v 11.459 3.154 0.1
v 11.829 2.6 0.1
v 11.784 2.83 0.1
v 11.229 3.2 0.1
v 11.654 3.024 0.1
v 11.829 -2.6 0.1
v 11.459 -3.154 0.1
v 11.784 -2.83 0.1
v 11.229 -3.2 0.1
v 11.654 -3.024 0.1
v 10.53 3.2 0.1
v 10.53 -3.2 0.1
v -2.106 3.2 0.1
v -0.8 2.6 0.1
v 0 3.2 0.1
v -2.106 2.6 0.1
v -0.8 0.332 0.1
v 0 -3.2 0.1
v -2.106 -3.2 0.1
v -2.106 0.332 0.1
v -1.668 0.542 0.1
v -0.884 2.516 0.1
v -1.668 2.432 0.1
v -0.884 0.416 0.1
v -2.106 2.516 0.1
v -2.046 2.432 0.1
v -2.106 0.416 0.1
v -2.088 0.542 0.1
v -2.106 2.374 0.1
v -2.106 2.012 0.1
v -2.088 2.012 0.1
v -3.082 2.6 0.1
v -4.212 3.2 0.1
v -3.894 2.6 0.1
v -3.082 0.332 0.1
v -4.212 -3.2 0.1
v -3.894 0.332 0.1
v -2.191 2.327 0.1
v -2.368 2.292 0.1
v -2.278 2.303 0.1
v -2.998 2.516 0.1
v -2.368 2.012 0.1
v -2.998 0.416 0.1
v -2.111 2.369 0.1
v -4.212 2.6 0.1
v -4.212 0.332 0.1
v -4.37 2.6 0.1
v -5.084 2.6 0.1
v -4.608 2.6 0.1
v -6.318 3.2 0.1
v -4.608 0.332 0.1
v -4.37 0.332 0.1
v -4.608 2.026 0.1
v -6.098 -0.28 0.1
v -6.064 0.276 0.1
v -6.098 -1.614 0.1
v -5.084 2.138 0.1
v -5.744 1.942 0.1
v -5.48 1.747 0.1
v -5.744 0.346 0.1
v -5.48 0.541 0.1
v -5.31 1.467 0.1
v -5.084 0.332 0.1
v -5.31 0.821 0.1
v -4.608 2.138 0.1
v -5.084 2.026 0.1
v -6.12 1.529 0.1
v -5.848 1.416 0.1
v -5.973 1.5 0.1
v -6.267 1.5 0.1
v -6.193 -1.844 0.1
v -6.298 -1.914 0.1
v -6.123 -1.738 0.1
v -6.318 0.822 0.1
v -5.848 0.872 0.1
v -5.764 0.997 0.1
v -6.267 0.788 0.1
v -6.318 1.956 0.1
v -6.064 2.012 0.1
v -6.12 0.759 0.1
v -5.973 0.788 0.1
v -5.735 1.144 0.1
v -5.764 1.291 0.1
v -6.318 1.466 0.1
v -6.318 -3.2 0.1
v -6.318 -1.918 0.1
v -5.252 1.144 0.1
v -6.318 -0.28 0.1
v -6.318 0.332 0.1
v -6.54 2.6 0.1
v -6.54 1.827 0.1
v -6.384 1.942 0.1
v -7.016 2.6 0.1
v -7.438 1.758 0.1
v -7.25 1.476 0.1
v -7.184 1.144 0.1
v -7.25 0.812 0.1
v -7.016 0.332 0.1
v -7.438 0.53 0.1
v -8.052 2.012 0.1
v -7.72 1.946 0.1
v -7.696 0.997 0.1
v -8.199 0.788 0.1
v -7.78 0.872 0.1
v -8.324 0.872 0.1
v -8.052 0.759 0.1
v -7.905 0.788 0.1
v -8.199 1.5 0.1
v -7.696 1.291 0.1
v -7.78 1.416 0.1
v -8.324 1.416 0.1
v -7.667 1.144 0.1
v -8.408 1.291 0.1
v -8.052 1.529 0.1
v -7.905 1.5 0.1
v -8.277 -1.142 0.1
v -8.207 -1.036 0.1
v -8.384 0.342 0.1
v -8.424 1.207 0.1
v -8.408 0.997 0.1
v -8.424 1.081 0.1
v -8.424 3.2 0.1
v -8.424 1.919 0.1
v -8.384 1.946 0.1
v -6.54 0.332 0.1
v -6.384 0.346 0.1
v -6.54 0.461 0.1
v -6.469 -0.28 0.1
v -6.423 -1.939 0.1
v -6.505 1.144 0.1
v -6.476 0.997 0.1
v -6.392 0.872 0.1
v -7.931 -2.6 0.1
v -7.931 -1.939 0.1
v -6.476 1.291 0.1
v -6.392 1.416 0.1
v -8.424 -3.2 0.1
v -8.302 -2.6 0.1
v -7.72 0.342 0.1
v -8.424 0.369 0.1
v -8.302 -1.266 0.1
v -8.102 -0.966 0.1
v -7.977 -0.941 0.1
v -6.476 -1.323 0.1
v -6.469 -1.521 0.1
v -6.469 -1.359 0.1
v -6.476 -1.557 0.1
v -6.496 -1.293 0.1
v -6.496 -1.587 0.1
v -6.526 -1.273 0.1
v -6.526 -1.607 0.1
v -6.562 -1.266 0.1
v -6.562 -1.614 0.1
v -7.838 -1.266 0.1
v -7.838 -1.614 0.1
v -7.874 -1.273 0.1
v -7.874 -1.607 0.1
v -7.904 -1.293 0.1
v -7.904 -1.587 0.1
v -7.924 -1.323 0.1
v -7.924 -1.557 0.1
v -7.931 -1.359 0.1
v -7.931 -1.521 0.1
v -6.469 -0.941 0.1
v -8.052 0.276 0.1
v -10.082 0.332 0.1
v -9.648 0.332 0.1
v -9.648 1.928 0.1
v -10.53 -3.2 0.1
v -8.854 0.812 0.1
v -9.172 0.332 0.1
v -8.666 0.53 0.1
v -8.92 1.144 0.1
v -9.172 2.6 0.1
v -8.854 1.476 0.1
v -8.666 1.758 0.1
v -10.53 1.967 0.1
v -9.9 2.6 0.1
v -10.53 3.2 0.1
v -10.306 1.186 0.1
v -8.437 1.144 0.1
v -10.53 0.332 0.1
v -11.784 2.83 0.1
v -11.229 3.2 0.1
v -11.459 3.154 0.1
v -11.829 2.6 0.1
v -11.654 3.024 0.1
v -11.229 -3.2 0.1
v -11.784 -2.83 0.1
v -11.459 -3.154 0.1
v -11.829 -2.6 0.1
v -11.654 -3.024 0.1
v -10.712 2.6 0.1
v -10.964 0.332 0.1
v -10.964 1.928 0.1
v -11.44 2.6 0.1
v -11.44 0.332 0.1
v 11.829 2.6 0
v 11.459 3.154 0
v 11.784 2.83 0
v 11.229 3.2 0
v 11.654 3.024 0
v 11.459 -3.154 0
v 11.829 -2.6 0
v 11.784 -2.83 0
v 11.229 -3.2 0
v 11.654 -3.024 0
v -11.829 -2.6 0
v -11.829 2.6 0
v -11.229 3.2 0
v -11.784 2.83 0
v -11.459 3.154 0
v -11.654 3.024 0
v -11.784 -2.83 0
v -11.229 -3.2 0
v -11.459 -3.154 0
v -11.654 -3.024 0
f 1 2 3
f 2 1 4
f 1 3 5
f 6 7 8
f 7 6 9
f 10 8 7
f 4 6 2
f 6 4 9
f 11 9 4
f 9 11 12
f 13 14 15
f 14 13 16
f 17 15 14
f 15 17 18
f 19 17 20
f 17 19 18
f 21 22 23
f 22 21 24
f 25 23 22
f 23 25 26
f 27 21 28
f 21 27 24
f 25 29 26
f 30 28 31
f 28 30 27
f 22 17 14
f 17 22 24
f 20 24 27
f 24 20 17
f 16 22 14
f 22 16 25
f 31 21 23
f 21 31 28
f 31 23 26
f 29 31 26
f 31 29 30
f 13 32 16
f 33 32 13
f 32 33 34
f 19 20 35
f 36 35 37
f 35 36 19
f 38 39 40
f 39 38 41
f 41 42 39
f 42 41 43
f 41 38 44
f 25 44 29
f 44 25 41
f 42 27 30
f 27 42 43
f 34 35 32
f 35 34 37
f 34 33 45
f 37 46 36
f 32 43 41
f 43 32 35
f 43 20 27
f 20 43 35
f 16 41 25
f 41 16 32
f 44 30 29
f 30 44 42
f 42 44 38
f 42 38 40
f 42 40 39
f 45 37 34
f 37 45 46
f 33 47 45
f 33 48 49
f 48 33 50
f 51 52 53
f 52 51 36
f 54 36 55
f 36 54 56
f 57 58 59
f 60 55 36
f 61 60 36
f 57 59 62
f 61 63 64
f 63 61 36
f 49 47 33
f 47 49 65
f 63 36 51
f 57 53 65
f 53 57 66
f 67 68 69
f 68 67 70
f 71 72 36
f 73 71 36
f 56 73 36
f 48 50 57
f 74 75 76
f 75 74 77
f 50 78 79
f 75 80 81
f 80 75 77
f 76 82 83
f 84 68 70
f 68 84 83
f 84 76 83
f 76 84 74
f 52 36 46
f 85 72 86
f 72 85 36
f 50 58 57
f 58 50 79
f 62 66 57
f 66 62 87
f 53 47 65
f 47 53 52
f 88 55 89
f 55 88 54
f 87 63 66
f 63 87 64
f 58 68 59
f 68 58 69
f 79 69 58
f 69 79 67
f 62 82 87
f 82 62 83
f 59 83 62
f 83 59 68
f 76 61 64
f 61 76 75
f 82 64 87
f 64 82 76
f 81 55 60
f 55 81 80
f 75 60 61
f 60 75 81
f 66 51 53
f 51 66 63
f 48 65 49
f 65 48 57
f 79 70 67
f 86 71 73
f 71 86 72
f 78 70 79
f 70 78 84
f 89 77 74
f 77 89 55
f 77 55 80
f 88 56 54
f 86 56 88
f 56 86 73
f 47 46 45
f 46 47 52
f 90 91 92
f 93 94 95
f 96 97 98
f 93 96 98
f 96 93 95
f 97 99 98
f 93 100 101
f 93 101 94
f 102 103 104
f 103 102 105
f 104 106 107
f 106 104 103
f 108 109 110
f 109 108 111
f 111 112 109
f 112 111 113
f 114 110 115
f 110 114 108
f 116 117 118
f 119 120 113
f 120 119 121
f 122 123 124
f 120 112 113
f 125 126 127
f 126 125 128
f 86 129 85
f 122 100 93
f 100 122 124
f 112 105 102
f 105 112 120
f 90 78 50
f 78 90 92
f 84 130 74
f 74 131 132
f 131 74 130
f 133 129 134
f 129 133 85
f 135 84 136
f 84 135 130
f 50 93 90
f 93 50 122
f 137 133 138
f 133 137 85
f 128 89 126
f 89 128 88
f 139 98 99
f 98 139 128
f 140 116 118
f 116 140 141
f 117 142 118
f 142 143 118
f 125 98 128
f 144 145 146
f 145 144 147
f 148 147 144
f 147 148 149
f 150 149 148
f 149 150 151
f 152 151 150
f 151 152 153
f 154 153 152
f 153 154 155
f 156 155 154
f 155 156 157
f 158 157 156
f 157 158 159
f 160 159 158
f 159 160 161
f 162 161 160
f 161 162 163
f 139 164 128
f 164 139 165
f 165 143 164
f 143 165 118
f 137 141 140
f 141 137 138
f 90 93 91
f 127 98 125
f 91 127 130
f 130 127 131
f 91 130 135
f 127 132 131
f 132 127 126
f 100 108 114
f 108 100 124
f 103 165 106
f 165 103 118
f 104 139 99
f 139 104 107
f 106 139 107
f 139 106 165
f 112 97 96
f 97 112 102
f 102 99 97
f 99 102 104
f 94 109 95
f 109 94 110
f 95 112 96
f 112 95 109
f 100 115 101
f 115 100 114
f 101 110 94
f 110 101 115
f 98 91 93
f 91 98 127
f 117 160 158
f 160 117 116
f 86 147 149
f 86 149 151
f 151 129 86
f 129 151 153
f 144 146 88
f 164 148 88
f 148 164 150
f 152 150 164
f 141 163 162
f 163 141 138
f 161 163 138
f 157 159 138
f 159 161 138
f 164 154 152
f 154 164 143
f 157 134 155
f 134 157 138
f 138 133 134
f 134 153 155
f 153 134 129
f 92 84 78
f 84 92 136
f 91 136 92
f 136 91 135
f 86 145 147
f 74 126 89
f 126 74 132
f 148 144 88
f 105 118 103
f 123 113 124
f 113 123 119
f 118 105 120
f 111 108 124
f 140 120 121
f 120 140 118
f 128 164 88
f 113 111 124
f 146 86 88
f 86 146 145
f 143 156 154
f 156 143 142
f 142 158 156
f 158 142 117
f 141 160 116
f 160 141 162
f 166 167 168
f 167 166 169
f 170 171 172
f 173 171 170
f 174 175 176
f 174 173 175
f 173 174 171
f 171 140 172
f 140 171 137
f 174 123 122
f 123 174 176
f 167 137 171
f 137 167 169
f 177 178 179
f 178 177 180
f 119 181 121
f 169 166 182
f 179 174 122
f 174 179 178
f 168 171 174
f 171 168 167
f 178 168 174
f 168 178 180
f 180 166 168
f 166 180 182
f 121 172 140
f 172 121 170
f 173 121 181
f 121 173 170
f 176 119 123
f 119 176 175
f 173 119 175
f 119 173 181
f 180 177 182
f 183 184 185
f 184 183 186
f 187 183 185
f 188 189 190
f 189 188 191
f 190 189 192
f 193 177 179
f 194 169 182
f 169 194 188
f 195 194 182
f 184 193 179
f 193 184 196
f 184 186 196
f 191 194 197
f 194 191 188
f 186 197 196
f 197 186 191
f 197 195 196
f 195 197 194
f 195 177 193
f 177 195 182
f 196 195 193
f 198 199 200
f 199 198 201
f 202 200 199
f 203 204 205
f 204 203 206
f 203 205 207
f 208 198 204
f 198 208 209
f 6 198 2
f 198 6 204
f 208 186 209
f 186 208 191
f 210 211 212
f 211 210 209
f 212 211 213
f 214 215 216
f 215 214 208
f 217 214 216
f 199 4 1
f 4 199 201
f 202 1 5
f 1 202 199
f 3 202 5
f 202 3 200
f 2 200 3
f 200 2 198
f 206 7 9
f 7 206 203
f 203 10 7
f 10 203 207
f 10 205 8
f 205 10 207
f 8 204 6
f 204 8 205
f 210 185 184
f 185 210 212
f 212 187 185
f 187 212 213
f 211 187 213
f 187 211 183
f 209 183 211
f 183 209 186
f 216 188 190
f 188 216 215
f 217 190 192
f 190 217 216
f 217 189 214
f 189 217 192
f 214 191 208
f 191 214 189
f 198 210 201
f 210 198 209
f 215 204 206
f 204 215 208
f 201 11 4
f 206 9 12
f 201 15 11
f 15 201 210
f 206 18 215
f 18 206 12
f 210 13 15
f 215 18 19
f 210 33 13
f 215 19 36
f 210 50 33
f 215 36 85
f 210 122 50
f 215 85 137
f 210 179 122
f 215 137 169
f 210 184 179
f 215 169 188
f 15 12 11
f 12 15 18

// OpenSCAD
// file: ../p/box3u12.scad
use <../lib.scad>
function ldraw_lib__box3u12() = [
// 0 Box with 3 Parallel Faces without Any Edges
// 0 Name: box3u12.dat
// 0 Author: J.C. Tchang [tchang]
// 0 !LDRAW_ORG Primitive UPDATE 2014-02
// 0 !LICENSE Licensed under CC BY 4.0 : see CAreadme.txt
// 
// 0 BFC CERTIFY CCW
  [0,"BFC","CERTIFY"],
  [0,"BFC","CCW"],
// 
// 0 !HISTORY 2014-12-23 [PTadmin] Official Update 2014-02
// 
// 
// 4 16 -1 1 1 1 1 1 1 1 -1 -1 1 -1
  [4,16,-1,1,1,1,1,1,1,1,-1,-1,1,-1],
// 4 16 -1 1 1 -1 0 1 1 0 1 1 1 1
  [4,16,-1,1,1,-1,0,1,1,0,1,1,1,1],
// 4 16 1 1 -1 1 0 -1 -1 0 -1 -1 1 -1
  [4,16,1,1,-1,1,0,-1,-1,0,-1,-1,1,-1],
];
module ldraw_lib__box3u12(step=0, col=false, unit=2/5, alt=false, line=0.2, solid=!$preview)
    makepoly(ldraw_lib__box3u12(), step=step, col=col, unit=unit, alt=alt, line=line, solid=solid);
ldraw_lib__box3u12(line=0.2);
// file: ../p/1-4cyli.scad
use <../lib.scad>
function ldraw_lib__1_4cyli() = [
// 0 Cylinder 0.25
// 0 Name: 1-4cyli.dat
// 0 Author: James Jessiman
// 0 !LDRAW_ORG Primitive UPDATE 2012-01
// 0 !LICENSE Licensed under CC BY 4.0 : see CAreadme.txt
// 
// 0 BFC CERTIFY CCW
  [0,"BFC","CERTIFY"],
  [0,"BFC","CCW"],
// 
// 0 !HISTORY 2002-03-23 [sbliss] Added BFC statement.
// 0 !HISTORY 2002-04-25 [PTadmin] Official Update 2002-02
// 0 !HISTORY 2007-06-22 [PTadmin] Header formatted for Contributor Agreement
// 0 !HISTORY 2008-07-01 [PTadmin] Official Update 2008-01
// 0 !HISTORY 2012-02-16 [Philo] Changed to CCW
// 0 !HISTORY 2012-03-30 [PTadmin] Official Update 2012-01
// 
// 
// 4 16 1 1 0 0.9239 1 0.3827 0.9239 0 0.3827 1 0 0
  [4,16,1,1,0,0.9239,1,0.3827,0.9239,0,0.3827,1,0,0],
// 5 24 1 0 0 1 1 0 0.9239 0 0.3827 1 0 -1
  [5,24,1,0,0,1,1,0,0.9239,0,0.3827,1,0,-1],
// 4 16 0.9239 1 0.3827 0.7071 1 0.7071 0.7071 0 0.7071 0.9239 0 0.3827
  [4,16,0.9239,1,0.3827,0.7071,1,0.7071,0.7071,0,0.7071,0.9239,0,0.3827],
// 5 24 0.9239 0 0.3827 0.9239 1 0.3827 0.7071 0 0.7071 1 0 0
  [5,24,0.9239,0,0.3827,0.9239,1,0.3827,0.7071,0,0.7071,1,0,0],
// 4 16 0.7071 1 0.7071 0.3827 1 0.9239 0.3827 0 0.9239 0.7071 0 0.7071
  [4,16,0.7071,1,0.7071,0.3827,1,0.9239,0.3827,0,0.9239,0.7071,0,0.7071],
// 5 24 0.7071 0 0.7071 0.7071 1 0.7071 0.3827 0 0.9239 0.9239 0 0.3827
  [5,24,0.7071,0,0.7071,0.7071,1,0.7071,0.3827,0,0.9239,0.9239,0,0.3827],
// 4 16 0.3827 1 0.9239 0 1 1 0 0 1 0.3827 0 0.9239
  [4,16,0.3827,1,0.9239,0,1,1,0,0,1,0.3827,0,0.9239],
// 5 24 0.3827 0 0.9239 0.3827 1 0.9239 0 0 1 0.7071 0 0.7071
  [5,24,0.3827,0,0.9239,0.3827,1,0.9239,0,0,1,0.7071,0,0.7071],
// 5 24 0 0 1 0 1 1 0.3827 0 0.9239 -1 0 1
  [5,24,0,0,1,0,1,1,0.3827,0,0.9239,-1,0,1],
];
module ldraw_lib__1_4cyli(step=0, col=false, unit=2/5, alt=false, line=0.2, solid=!$preview)
    makepoly(ldraw_lib__1_4cyli(), step=step, col=col, unit=unit, alt=alt, line=line, solid=solid);
ldraw_lib__1_4cyli(line=0.2);
// file: ../p/1-4chrd.scad
use <../lib.scad>
function ldraw_lib__1_4chrd() = [
// 0 Chord 0.25
// 0 Name: 1-4chrd.dat
// 0 Author: Max Martin Richter [MMR1988]
// 0 !LDRAW_ORG Primitive UPDATE 2023-05
// 0 !LICENSE Licensed under CC BY 4.0 : see CAreadme.txt
// 
// 0 BFC CERTIFY CCW
  [0,"BFC","CERTIFY"],
  [0,"BFC","CCW"],
// 
// 0 !HISTORY 2004-04-22 [PTadmin] Official Update 2004-02
// 0 !HISTORY 2007-10-09 [PTadmin] Header formatted for Contributor Agreement
// 0 !HISTORY 2008-07-01 [PTadmin] Official Update 2008-01
// 0 !HISTORY 2012-08-02 [MMR1988] Re-creation with PrimGen2 and Rectifier
// 0 !HISTORY 2012-08-09 [PTadmin] Official Update 2012-02
// 0 !HISTORY 2023-10-27 [OrionP] Change author to MMR1988 from hafhead
// 0 !HISTORY 2023-10-31 [OrionP] Official Update 2023-05
// 
// 4 16 0.9239 0 0.3827 0.3827 0 0.9239 0 0 1 1 0 0
  [4,16,0.9239,0,0.3827,0.3827,0,0.9239,0,0,1,1,0,0],
// 3 16 0.7071 0 0.7071 0.3827 0 0.9239 0.9239 0 0.3827
  [3,16,0.7071,0,0.7071,0.3827,0,0.9239,0.9239,0,0.3827],
];
module ldraw_lib__1_4chrd(step=0, col=false, unit=2/5, alt=false, line=0.2, solid=!$preview)
    makepoly(ldraw_lib__1_4chrd(), step=step, col=col, unit=unit, alt=alt, line=line, solid=solid);
ldraw_lib__1_4chrd(line=0.2);
// file: s/6221655ks08.scad
use <../../lib.scad>
use <../../p/1-4chrd.scad>
use <../../p/1-4cyli.scad>
use <../../p/box3u12.scad>
function ldraw_lib__s__6221655ks08() = [
// 0 ~Sticker  0.8 x  3.0 with White Logos on Black Background Right - Bottom Face
// 0 Name: s\6221655ks08.dat
// 0 Author: Massimo Maso [Sirio]
// 0 !LDRAW_ORG Subpart UPDATE 2025-03
// 0 !LICENSE Licensed under CC BY 4.0 : see CAreadme.txt
// 
// 0 BFC CERTIFY CCW
  [0,"BFC","CERTIFY"],
  [0,"BFC","CCW"],
// 
// 0 !HISTORY 2025-03-30 [OrionP] Official Update 2025-03
// 
// 0 // Primitives
// 1 16 -6.5 0 28.0735 -1.5 0 0 0 -1 0 0 0 1.5 1-4chrd.dat
  [1,16,-6.5,0,28.0735,-1.5,0,0,0,-1,0,0,0,1.5, ldraw_lib__1_4chrd()],
// 1 16 6.5 0 28.0735 1.5 0 0 0 -1 0 0 0 1.5 1-4chrd.dat
  [1,16,6.5,0,28.0735,1.5,0,0,0,-1,0,0,0,1.5, ldraw_lib__1_4chrd()],
// 1 16 0 -.25 0 6.5 0 0 0 .25 0 0 0 29.5735 box3u12.dat
  [1,16,0,-.25,0,6.5,0,0,0,.25,0,0,0,29.5735, ldraw_lib__box3u12()],
// 1 16 -6.5 0 -28.0735 -1.5 0 0 0 -1 0 0 0 -1.5 1-4chrd.dat
  [1,16,-6.5,0,-28.0735,-1.5,0,0,0,-1,0,0,0,-1.5, ldraw_lib__1_4chrd()],
// 1 16 6.5 0 -28.0735 1.5 0 0 0 -1 0 0 0 -1.5 1-4chrd.dat
  [1,16,6.5,0,-28.0735,1.5,0,0,0,-1,0,0,0,-1.5, ldraw_lib__1_4chrd()],
// 1 16 -6.5 -.25 28.0735 -1.5 0 0 0 .25 0 0 0 1.5 1-4cyli.dat
  [1,16,-6.5,-.25,28.0735,-1.5,0,0,0,.25,0,0,0,1.5, ldraw_lib__1_4cyli()],
// 1 16 6.5 -.25 28.0735 1.5 0 0 0 .25 0 0 0 1.5 1-4cyli.dat
  [1,16,6.5,-.25,28.0735,1.5,0,0,0,.25,0,0,0,1.5, ldraw_lib__1_4cyli()],
// 1 16 -6.5 -.25 -28.0735 -1.5 0 0 0 .25 0 0 0 -1.5 1-4cyli.dat
  [1,16,-6.5,-.25,-28.0735,-1.5,0,0,0,.25,0,0,0,-1.5, ldraw_lib__1_4cyli()],
// 1 16 6.5 -.25 -28.0735 1.5 0 0 0 .25 0 0 0 -1.5 1-4cyli.dat
  [1,16,6.5,-.25,-28.0735,1.5,0,0,0,.25,0,0,0,-1.5, ldraw_lib__1_4cyli()],
// 0 // Bottom faces
// 4 16 -6.5 0 29.5735 -6.5 0 -29.5735 -8 0 -28.0735 -8 0 28.0735
  [4,16,-6.5,0,29.5735,-6.5,0,-29.5735,-8,0,-28.0735,-8,0,28.0735],
// 4 16 6.5 0 29.5735 8 0 28.0735 8 0 -28.0735 6.5 0 -29.5735
  [4,16,6.5,0,29.5735,8,0,28.0735,8,0,-28.0735,6.5,0,-29.5735],
// 0 // Lateral faces
// 3 16 -8 0 28.0735 -8 -.25 26.3259 -8 -.25 28.0735
  [3,16,-8,0,28.0735,-8,-.25,26.3259,-8,-.25,28.0735],
// 3 16 8 0 28.0735 8 -.25 28.0735 8 -.25 26.3259
  [3,16,8,0,28.0735,8,-.25,28.0735,8,-.25,26.3259],
// 4 16 -8 0 -28.0735 -8 -.25 0 -8 -.25 26.3259 -8 0 28.0735
  [4,16,-8,0,-28.0735,-8,-.25,0,-8,-.25,26.3259,-8,0,28.0735],
// 4 16 8 0 -28.0735 8 0 28.0735 8 -.25 26.3259 8 -.25 0
  [4,16,8,0,-28.0735,8,0,28.0735,8,-.25,26.3259,8,-.25,0],
// 3 16 -8 0 -28.0735 -8 -.25 -5.2651 -8 -.25 0
  [3,16,-8,0,-28.0735,-8,-.25,-5.2651,-8,-.25,0],
// 3 16 8 0 -28.0735 8 -.25 0 8 -.25 -5.2651
  [3,16,8,0,-28.0735,8,-.25,0,8,-.25,-5.2651],
// 3 16 -8 0 -28.0735 -8 -.25 -10.5298 -8 -.25 -5.2651
  [3,16,-8,0,-28.0735,-8,-.25,-10.5298,-8,-.25,-5.2651],
// 3 16 8 0 -28.0735 8 -.25 -5.2651 8 -.25 -10.5298
  [3,16,8,0,-28.0735,8,-.25,-5.2651,8,-.25,-10.5298],
// 3 16 -8 0 -28.0735 -8 -.25 -15.795 -8 -.25 -10.5298
  [3,16,-8,0,-28.0735,-8,-.25,-15.795,-8,-.25,-10.5298],
// 3 16 8 0 -28.0735 8 -.25 -10.5298 8 -.25 -15.795
  [3,16,8,0,-28.0735,8,-.25,-10.5298,8,-.25,-15.795],
// 3 16 -8 0 -28.0735 -8 -.25 -21.0609 -8 -.25 -15.795
  [3,16,-8,0,-28.0735,-8,-.25,-21.0609,-8,-.25,-15.795],
// 3 16 8 0 -28.0735 8 -.25 -15.795 8 -.25 -21.0609
  [3,16,8,0,-28.0735,8,-.25,-15.795,8,-.25,-21.0609],
// 3 16 -8 0 -28.0735 -8 -.25 -26.3259 -8 -.25 -21.0609
  [3,16,-8,0,-28.0735,-8,-.25,-26.3259,-8,-.25,-21.0609],
// 3 16 8 0 -28.0735 8 -.25 -21.0609 8 -.25 -26.3259
  [3,16,8,0,-28.0735,8,-.25,-21.0609,8,-.25,-26.3259],
// 3 16 -8 0 -28.0735 -8 -.25 -28.0735 -8 -.25 -26.3259
  [3,16,-8,0,-28.0735,-8,-.25,-28.0735,-8,-.25,-26.3259],
// 3 16 8 0 -28.0735 8 -.25 -26.3259 8 -.25 -28.0735
  [3,16,8,0,-28.0735,8,-.25,-26.3259,8,-.25,-28.0735],
];
module ldraw_lib__s__6221655ks08(step=0, col=false, unit=2/5, alt=false, line=0.2, solid=!$preview)
    makepoly(ldraw_lib__s__6221655ks08(), step=step, col=col, unit=unit, alt=alt, line=line, solid=solid);
ldraw_lib__s__6221655ks08(line=0.2);
// file: s/6221655ks07.scad
use <../../lib.scad>
use <../../p/1-4chrd.scad>
function ldraw_lib__s__6221655ks07() = [
// 0 ~Sticker  0.8 x  3.0 with White Logos on Black Background Right - Twelfth Face
// 0 Name: s\6221655ks07.dat
// 0 Author: Massimo Maso [Sirio]
// 0 !LDRAW_ORG Subpart UPDATE 2025-03
// 0 !LICENSE Licensed under CC BY 4.0 : see CAreadme.txt
// 
// 0 BFC CERTIFY CCW
  [0,"BFC","CERTIFY"],
  [0,"BFC","CCW"],
// 
// 0 !HISTORY 2025-03-30 [OrionP] Official Update 2025-03
// 
// 0 // Primitives
// 1 0 -6.5 -.25 -1.7313 -1.5 0 0 0 1 0 0 0 -1.5 1-4chrd.dat
  [1,0,-6.5,-.25,-1.7313,-1.5,0,0,0,1,0,0,0,-1.5, ldraw_lib__1_4chrd()],
// 1 0 6.5 -.25 -1.7313 1.5 0 0 0 1 0 0 0 -1.5 1-4chrd.dat
  [1,0,6.5,-.25,-1.7313,1.5,0,0,0,1,0,0,0,-1.5, ldraw_lib__1_4chrd()],
// 0 // Faces
// 0 // Black faces
// 3 0 -6.5 -.25 -.4378 -4.9185 -.25 .0163 -8 -.25 .0163
  [3,0,-6.5,-.25,-.4378,-4.9185,-.25,.0163,-8,-.25,.0163],
// 4 0 8 -.25 .0163 -.83 -.25 .0163 -.83 -.25 -1.0678 8 -.25 -1.7313
  [4,0,8,-.25,.0163,-.83,-.25,.0163,-.83,-.25,-1.0678,8,-.25,-1.7313],
// 3 0 -4.82 -.25 -1.0678 -.83 -.25 -1.0678 -.83 -.25 .0163
  [3,0,-4.82,-.25,-1.0678,-.83,-.25,-1.0678,-.83,-.25,.0163],
// 4 0 -8 -.25 .0163 -8 -.25 -1.7313 -6.5 -.25 -2.2578 -6.5 -.25 -.4378
  [4,0,-8,-.25,.0163,-8,-.25,-1.7313,-6.5,-.25,-2.2578,-6.5,-.25,-.4378],
// 3 0 -8 -.25 -1.7313 -6.5 -.25 -3.2313 -6.5 -.25 -2.2578
  [3,0,-8,-.25,-1.7313,-6.5,-.25,-3.2313,-6.5,-.25,-2.2578],
// 4 0 6.5 -.25 -3.2313 8 -.25 -1.7313 -.83 -.25 -1.0678 -.83 -.25 -2.2578
  [4,0,6.5,-.25,-3.2313,8,-.25,-1.7313,-.83,-.25,-1.0678,-.83,-.25,-2.2578],
// 4 0 -6.5 -.25 -2.2578 -6.5 -.25 -3.2313 6.5 -.25 -3.2313 -.83 -.25 -2.2578
  [4,0,-6.5,-.25,-2.2578,-6.5,-.25,-3.2313,6.5,-.25,-3.2313,-.83,-.25,-2.2578],
// 0 // White faces
// 4 15 -4.82 -.25 -1.0678 -6.5 -.25 -2.2578 -.83 -.25 -2.2578 -.83 -.25 -1.0678
  [4,15,-4.82,-.25,-1.0678,-6.5,-.25,-2.2578,-.83,-.25,-2.2578,-.83,-.25,-1.0678],
// 4 15 -6.5 -.25 -.4378 -4.82 -.25 -1.0678 -.83 -.25 .0163 -4.9185 -.25 .0163
  [4,15,-6.5,-.25,-.4378,-4.82,-.25,-1.0678,-.83,-.25,.0163,-4.9185,-.25,.0163],
// 3 15 -6.5 -.25 -2.2578 -4.82 -.25 -1.0678 -6.5 -.25 -.4378
  [3,15,-6.5,-.25,-2.2578,-4.82,-.25,-1.0678,-6.5,-.25,-.4378],
];
module ldraw_lib__s__6221655ks07(step=0, col=false, unit=2/5, alt=false, line=0.2, solid=!$preview)
    makepoly(ldraw_lib__s__6221655ks07(), step=step, col=col, unit=unit, alt=alt, line=line, solid=solid);
ldraw_lib__s__6221655ks07(line=0.2);
// file: s/6221655ks06.scad
use <../../lib.scad>
function ldraw_lib__s__6221655ks06() = [
// 0 ~Sticker  0.8 x  3.0 with White Logos on Black Background Right - Eleventh Face
// 0 Name: s\6221655ks06.dat
// 0 Author: Massimo Maso [Sirio]
// 0 !LDRAW_ORG Subpart UPDATE 2025-03
// 0 !LICENSE Licensed under CC BY 4.0 : see CAreadme.txt
// 
// 0 BFC CERTIFY CCW
  [0,"BFC","CERTIFY"],
  [0,"BFC","CCW"],
// 
// 0 !HISTORY 2025-03-30 [OrionP] Official Update 2025-03
// 
// 0 // Faces
// 0 // Black faces
// 4 0 8 -.25 -.0163 -.83 -.25 2.1896 -4.82 -.25 2.1896 -.83 -.25 1.1046
  [4,0,8,-.25,-.0163,-.83,-.25,2.1896,-4.82,-.25,2.1896,-.83,-.25,1.1046],
// 3 0 -2.0298 -.25 4.1748 -.83 -.25 3.3796 -1.3256 -.25 4.6452
  [3,0,-2.0298,-.25,4.1748,-.83,-.25,3.3796,-1.3256,-.25,4.6452],
// 3 0 -2.86 -.25 4.0096 -.83 -.25 3.3796 -2.0298 -.25 4.1748
  [3,0,-2.86,-.25,4.0096,-.83,-.25,3.3796,-2.0298,-.25,4.1748],
// 3 0 -6.5 -.25 3.3796 -3.6902 -.25 4.1748 -4.3944 -.25 4.6452
  [3,0,-6.5,-.25,3.3796,-3.6902,-.25,4.1748,-4.3944,-.25,4.6452],
// 4 0 -3.6902 -.25 4.1748 -6.5 -.25 3.3796 -.83 -.25 3.3796 -2.86 -.25 4.0096
  [4,0,-3.6902,-.25,4.1748,-6.5,-.25,3.3796,-.83,-.25,3.3796,-2.86,-.25,4.0096],
// 4 0 -.9225 -.25 5.2487 -1.3256 -.25 4.6452 -.83 -.25 3.3796 8 -.25 5.2487
  [4,0,-.9225,-.25,5.2487,-1.3256,-.25,4.6452,-.83,-.25,3.3796,8,-.25,5.2487],
// 4 0 -4.3944 -.25 4.6452 -4.7975 -.25 5.2487 -8 -.25 5.2487 -6.5 -.25 3.3796
  [4,0,-4.3944,-.25,4.6452,-4.7975,-.25,5.2487,-8,-.25,5.2487,-6.5,-.25,3.3796],
// 4 0 8 -.25 5.2487 -.83 -.25 3.3796 -.83 -.25 2.1896 8 -.25 -.0163
  [4,0,8,-.25,5.2487,-.83,-.25,3.3796,-.83,-.25,2.1896,8,-.25,-.0163],
// 4 0 -2.965 -.25 .5446 -6.5 -.25 1.5596 -8 -.25 -.0163 -4.9185 -.25 -.0163
  [4,0,-2.965,-.25,.5446,-6.5,-.25,1.5596,-8,-.25,-.0163,-4.9185,-.25,-.0163],
// 3 0 -3.0183 -.25 5.2487 -2.86 -.25 5.2171 -2.7017 -.25 5.2487
  [3,0,-3.0183,-.25,5.2487,-2.86,-.25,5.2171,-2.7017,-.25,5.2487],
// 3 0 8 -.25 -.0163 -.83 -.25 1.1046 -.83 -.25 -.0163
  [3,0,8,-.25,-.0163,-.83,-.25,1.1046,-.83,-.25,-.0163],
// 4 0 -6.5 -.25 3.3796 -8 -.25 5.2487 -8 -.25 -.0163 -6.5 -.25 1.5596
  [4,0,-6.5,-.25,3.3796,-8,-.25,5.2487,-8,-.25,-.0163,-6.5,-.25,1.5596],
// 0 // White faces
// 4 15 -4.82 -.25 2.1896 -.83 -.25 2.1896 -.83 -.25 3.3796 -6.5 -.25 3.3796
  [4,15,-4.82,-.25,2.1896,-.83,-.25,2.1896,-.83,-.25,3.3796,-6.5,-.25,3.3796],
// 4 15 -4.82 -.25 2.1896 -6.5 -.25 3.3796 -6.5 -.25 1.5596 -2.965 -.25 .5446
  [4,15,-4.82,-.25,2.1896,-6.5,-.25,3.3796,-6.5,-.25,1.5596,-2.965,-.25,.5446],
// 4 15 -.83 -.25 1.1046 -4.82 -.25 2.1896 -2.965 -.25 .5446 -.83 -.25 -.0163
  [4,15,-.83,-.25,1.1046,-4.82,-.25,2.1896,-2.965,-.25,.5446,-.83,-.25,-.0163],
// 4 15 -2.0298 -.25 4.1748 -1.3256 -.25 4.6452 -.9225 -.25 5.2487 -2.7017 -.25 5.2487
  [4,15,-2.0298,-.25,4.1748,-1.3256,-.25,4.6452,-.9225,-.25,5.2487,-2.7017,-.25,5.2487],
// 4 15 -2.7017 -.25 5.2487 -2.86 -.25 5.2171 -2.86 -.25 4.0096 -2.0298 -.25 4.1748
  [4,15,-2.7017,-.25,5.2487,-2.86,-.25,5.2171,-2.86,-.25,4.0096,-2.0298,-.25,4.1748],
// 4 15 -3.6902 -.25 4.1748 -3.0183 -.25 5.2487 -4.7975 -.25 5.2487 -4.3944 -.25 4.6452
  [4,15,-3.6902,-.25,4.1748,-3.0183,-.25,5.2487,-4.7975,-.25,5.2487,-4.3944,-.25,4.6452],
// 4 15 -2.86 -.25 4.0096 -2.86 -.25 5.2171 -3.0183 -.25 5.2487 -3.6902 -.25 4.1748
  [4,15,-2.86,-.25,4.0096,-2.86,-.25,5.2171,-3.0183,-.25,5.2487,-3.6902,-.25,4.1748],
// 3 15 -2.965 -.25 .5446 -4.9185 -.25 -.0163 -.83 -.25 -.0163
  [3,15,-2.965,-.25,.5446,-4.9185,-.25,-.0163,-.83,-.25,-.0163],
];
module ldraw_lib__s__6221655ks06(step=0, col=false, unit=2/5, alt=false, line=0.2, solid=!$preview)
    makepoly(ldraw_lib__s__6221655ks06(), step=step, col=col, unit=unit, alt=alt, line=line, solid=solid);
ldraw_lib__s__6221655ks06(line=0.2);
// file: s/6221655ks04.scad
use <../../lib.scad>
function ldraw_lib__s__6221655ks04() = [
// 0 ~Sticker  0.8 x  3.0 with White Logos on Black Background Right - Ninth Face
// 0 Name: s\6221655ks04.dat
// 0 Author: Massimo Maso [Sirio]
// 0 !LDRAW_ORG Subpart UPDATE 2025-03
// 0 !LICENSE Licensed under CC BY 4.0 : see CAreadme.txt
// 
// 0 BFC CERTIFY CCW
  [0,"BFC","CERTIFY"],
  [0,"BFC","CCW"],
// 
// 0 !HISTORY 2025-03-30 [OrionP] Official Update 2025-03
// 
// 0 // Faces
// 0 // Black faces
// 3 0 -8 -.25 5.2487 -6.5 -.25 4.8535 -6.5 -.25 5.2487
  [3,0,-8,-.25,5.2487,-6.5,-.25,4.8535,-6.5,-.25,5.2487],
// 4 0 -8 -.25 5.2487 -8 -.25 -.0165 -6.5 -.25 3.0685 -6.5 -.25 4.2585
  [4,0,-8,-.25,5.2487,-8,-.25,-.0165,-6.5,-.25,3.0685,-6.5,-.25,4.2585],
// 4 0 -5.065 -.25 4.2585 -.83 -.25 4.2585 8 -.25 5.2487 -.83 -.25 4.8535
  [4,0,-5.065,-.25,4.2585,-.83,-.25,4.2585,8,-.25,5.2487,-.83,-.25,4.8535],
// 4 0 4.035 -.25 .5335 8 -.25 5.2487 -.69 -.25 .6185 .7 -.25 .5335
  [4,0,4.035,-.25,.5335,8,-.25,5.2487,-.69,-.25,.6185,.7,-.25,.5335],
// 3 0 -5.345 -.25 3.0685 -4.8543 -.25 1.4193 -4.3678 -.25 2.0787
  [3,0,-5.345,-.25,3.0685,-4.8543,-.25,1.4193,-4.3678,-.25,2.0787],
// 3 0 -.8657 -.25 1.4193 -.69 -.25 .6185 8 -.25 5.2487
  [3,0,-.8657,-.25,1.4193,-.69,-.25,.6185,8,-.25,5.2487],
// 3 0 -1.3522 -.25 2.0787 -.8657 -.25 1.4193 8 -.25 5.2487
  [3,0,-1.3522,-.25,2.0787,-.8657,-.25,1.4193,8,-.25,5.2487],
// 3 0 -5.345 -.25 3.0685 -4.3678 -.25 2.0787 -3.6664 -.25 2.5029
  [3,0,-5.345,-.25,3.0685,-4.3678,-.25,2.0787,-3.6664,-.25,2.5029],
// 4 0 -.83 -.25 3.0685 -2.0536 -.25 2.5029 -1.3522 -.25 2.0787 8 -.25 5.2487
  [4,0,-.83,-.25,3.0685,-2.0536,-.25,2.5029,-1.3522,-.25,2.0787,8,-.25,5.2487],
// 4 0 -8 -.25 5.2487 -6.5 -.25 4.2585 -5.345 -.25 4.2585 -6.5 -.25 4.8535
  [4,0,-8,-.25,5.2487,-6.5,-.25,4.2585,-5.345,-.25,4.2585,-6.5,-.25,4.8535],
// 3 0 -.83 -.25 3.0685 8 -.25 5.2487 -.83 -.25 4.2585
  [3,0,-.83,-.25,3.0685,8,-.25,5.2487,-.83,-.25,4.2585],
// 4 0 -5.345 -.25 3.0685 -5.065 -.25 3.0685 -5.065 -.25 4.2585 -5.345 -.25 4.2585
  [4,0,-5.345,-.25,3.0685,-5.065,-.25,3.0685,-5.065,-.25,4.2585,-5.345,-.25,4.2585],
// 4 0 -3.749 -.25 .1103 -3.5404 -.25 1.1589 -3.749 -.25 .8467 -3.8225 -.25 .4785
  [4,0,-3.749,-.25,.1103,-3.5404,-.25,1.1589,-3.749,-.25,.8467,-3.8225,-.25,.4785],
// 3 0 4.6092 -.25 .2957 4.7852 -.25 .0323 8 -.25 5.2487
  [3,0,4.6092,-.25,.2957,4.7852,-.25,.0323,8,-.25,5.2487],
// 3 0 4.3458 -.25 .4717 4.6092 -.25 .2957 8 -.25 5.2487
  [3,0,4.3458,-.25,.4717,4.6092,-.25,.2957,8,-.25,5.2487],
// 3 0 4.035 -.25 .5335 4.3458 -.25 .4717 8 -.25 5.2487
  [3,0,4.035,-.25,.5335,4.3458,-.25,.4717,8,-.25,5.2487],
// 3 0 -6.5 -.25 3.0685 -8 -.25 -.0165 -5.345 -.25 3.0685
  [3,0,-6.5,-.25,3.0685,-8,-.25,-.0165,-5.345,-.25,3.0685],
// 4 0 -2.0557 -.25 -.0165 -1.971 -.25 .1103 -2.1796 -.25 1.1589 -2.4918 -.25 1.3675
  [4,0,-2.0557,-.25,-.0165,-1.971,-.25,.1103,-2.1796,-.25,1.1589,-2.4918,-.25,1.3675],
// 3 0 -8 -.25 -.0165 -4.8907 -.25 -.0165 -5.03 -.25 .6185
  [3,0,-8,-.25,-.0165,-4.8907,-.25,-.0165,-5.03,-.25,.6185],
// 4 0 -1.971 -.25 .8467 -2.1796 -.25 1.1589 -1.971 -.25 .1103 -1.8975 -.25 .4785
  [4,0,-1.971,-.25,.8467,-2.1796,-.25,1.1589,-1.971,-.25,.1103,-1.8975,-.25,.4785],
// 3 0 -2.4918 -.25 1.3675 -2.86 -.25 1.441 -3.2282 -.25 1.3675
  [3,0,-2.4918,-.25,1.3675,-2.86,-.25,1.441,-3.2282,-.25,1.3675],
// 4 0 -3.5404 -.25 1.1589 -3.749 -.25 .1103 -3.6643 -.25 -.0165 -3.2282 -.25 1.3675
  [4,0,-3.5404,-.25,1.1589,-3.749,-.25,.1103,-3.6643,-.25,-.0165,-3.2282,-.25,1.3675],
// 4 0 -2.0557 -.25 -.0165 -2.4918 -.25 1.3675 -3.2282 -.25 1.3675 -3.6643 -.25 -.0165
  [4,0,-2.0557,-.25,-.0165,-2.4918,-.25,1.3675,-3.2282,-.25,1.3675,-3.6643,-.25,-.0165],
// 3 0 -.83 -.25 4.8535 8 -.25 5.2487 -.83 -.25 5.2487
  [3,0,-.83,-.25,4.8535,8,-.25,5.2487,-.83,-.25,5.2487],
// 4 0 4.7949 -.25 -.0165 8 -.25 -.0165 8 -.25 5.2487 4.7852 -.25 .0323
  [4,0,4.7949,-.25,-.0165,8,-.25,-.0165,8,-.25,5.2487,4.7852,-.25,.0323],
// 4 0 -5.345 -.25 3.0685 -8 -.25 -.0165 -5.03 -.25 .6185 -4.8543 -.25 1.4193
  [4,0,-5.345,-.25,3.0685,-8,-.25,-.0165,-5.03,-.25,.6185,-4.8543,-.25,1.4193],
// 4 0 -3.6664 -.25 2.5029 -2.86 -.25 2.6485 -5.065 -.25 3.0685 -5.345 -.25 3.0685
  [4,0,-3.6664,-.25,2.5029,-2.86,-.25,2.6485,-5.065,-.25,3.0685,-5.345,-.25,3.0685],
// 4 0 -5.345 -.25 4.2585 -5.065 -.25 4.2585 -.83 -.25 4.8535 -6.5 -.25 4.8535
  [4,0,-5.345,-.25,4.2585,-5.065,-.25,4.2585,-.83,-.25,4.8535,-6.5,-.25,4.8535],
// 4 0 -.8293 -.25 -.0165 .7 -.25 -.0165 .7 -.25 .5335 -.69 -.25 .6185
  [4,0,-.8293,-.25,-.0165,.7,-.25,-.0165,.7,-.25,.5335,-.69,-.25,.6185],
// 4 0 -5.065 -.25 3.0685 -2.86 -.25 2.6485 -2.0536 -.25 2.5029 -.83 -.25 3.0685
  [4,0,-5.065,-.25,3.0685,-2.86,-.25,2.6485,-2.0536,-.25,2.5029,-.83,-.25,3.0685],
// 0 // Whtie faces
// 4 15 -4.8543 -.25 1.4193 -3.749 -.25 .8467 -3.5404 -.25 1.1589 -4.3678 -.25 2.0787
  [4,15,-4.8543,-.25,1.4193,-3.749,-.25,.8467,-3.5404,-.25,1.1589,-4.3678,-.25,2.0787],
// 4 15 -5.03 -.25 .6185 -3.8225 -.25 .4785 -3.749 -.25 .8467 -4.8543 -.25 1.4193
  [4,15,-5.03,-.25,.6185,-3.8225,-.25,.4785,-3.749,-.25,.8467,-4.8543,-.25,1.4193],
// 4 15 -3.6664 -.25 2.5029 -3.2282 -.25 1.3675 -2.86 -.25 1.441 -2.86 -.25 2.6485
  [4,15,-3.6664,-.25,2.5029,-3.2282,-.25,1.3675,-2.86,-.25,1.441,-2.86,-.25,2.6485],
// 4 15 -4.3678 -.25 2.0787 -3.5404 -.25 1.1589 -3.2282 -.25 1.3675 -3.6664 -.25 2.5029
  [4,15,-4.3678,-.25,2.0787,-3.5404,-.25,1.1589,-3.2282,-.25,1.3675,-3.6664,-.25,2.5029],
// 4 15 -2.0536 -.25 2.5029 -2.4918 -.25 1.3675 -2.1796 -.25 1.1589 -1.3522 -.25 2.0787
  [4,15,-2.0536,-.25,2.5029,-2.4918,-.25,1.3675,-2.1796,-.25,1.1589,-1.3522,-.25,2.0787],
// 4 15 -2.86 -.25 2.6485 -2.86 -.25 1.441 -2.4918 -.25 1.3675 -2.0536 -.25 2.5029
  [4,15,-2.86,-.25,2.6485,-2.86,-.25,1.441,-2.4918,-.25,1.3675,-2.0536,-.25,2.5029],
// 4 15 -.8657 -.25 1.4193 -1.971 -.25 .8467 -1.8975 -.25 .4785 -.69 -.25 .6185
  [4,15,-.8657,-.25,1.4193,-1.971,-.25,.8467,-1.8975,-.25,.4785,-.69,-.25,.6185],
// 4 15 -1.3522 -.25 2.0787 -2.1796 -.25 1.1589 -1.971 -.25 .8467 -.8657 -.25 1.4193
  [4,15,-1.3522,-.25,2.0787,-2.1796,-.25,1.1589,-1.971,-.25,.8467,-.8657,-.25,1.4193],
// 4 15 -5.065 -.25 3.0685 -.83 -.25 3.0685 -.83 -.25 4.2585 -5.065 -.25 4.2585
  [4,15,-5.065,-.25,3.0685,-.83,-.25,3.0685,-.83,-.25,4.2585,-5.065,-.25,4.2585],
// 4 15 -6.5 -.25 3.0685 -5.345 -.25 3.0685 -5.345 -.25 4.2585 -6.5 -.25 4.2585
  [4,15,-6.5,-.25,3.0685,-5.345,-.25,3.0685,-5.345,-.25,4.2585,-6.5,-.25,4.2585],
// 3 15 -5.03 -.25 .6185 -3.749 -.25 .1103 -3.8225 -.25 .4785
  [3,15,-5.03,-.25,.6185,-3.749,-.25,.1103,-3.8225,-.25,.4785],
// 4 15 4.6092 -.25 .2957 4.3458 -.25 .4717 4.7949 -.25 -.0165 4.7852 -.25 .0323
  [4,15,4.6092,-.25,.2957,4.3458,-.25,.4717,4.7949,-.25,-.0165,4.7852,-.25,.0323],
// 4 15 -3.6643 -.25 -.0165 -3.749 -.25 .1103 -5.03 -.25 .6185 -4.8907 -.25 -.0165
  [4,15,-3.6643,-.25,-.0165,-3.749,-.25,.1103,-5.03,-.25,.6185,-4.8907,-.25,-.0165],
// 4 15 -.69 -.25 .6185 -1.971 -.25 .1103 -2.0557 -.25 -.0165 -.8293 -.25 -.0165
  [4,15,-.69,-.25,.6185,-1.971,-.25,.1103,-2.0557,-.25,-.0165,-.8293,-.25,-.0165],
// 3 15 -1.971 -.25 .1103 -.69 -.25 .6185 -1.8975 -.25 .4785
  [3,15,-1.971,-.25,.1103,-.69,-.25,.6185,-1.8975,-.25,.4785],
// 3 15 .7 -.25 -.0165 4.035 -.25 .5335 .7 -.25 .5335
  [3,15,.7,-.25,-.0165,4.035,-.25,.5335,.7,-.25,.5335],
// 4 15 4.035 -.25 .5335 .7 -.25 -.0165 4.7949 -.25 -.0165 4.3458 -.25 .4717
  [4,15,4.035,-.25,.5335,.7,-.25,-.0165,4.7949,-.25,-.0165,4.3458,-.25,.4717],
// 4 15 -6.5 -.25 5.2487 -6.5 -.25 4.8535 -.83 -.25 4.8535 -.83 -.25 5.2487
  [4,15,-6.5,-.25,5.2487,-6.5,-.25,4.8535,-.83,-.25,4.8535,-.83,-.25,5.2487],
];
module ldraw_lib__s__6221655ks04(step=0, col=false, unit=2/5, alt=false, line=0.2, solid=!$preview)
    makepoly(ldraw_lib__s__6221655ks04(), step=step, col=col, unit=unit, alt=alt, line=line, solid=solid);
ldraw_lib__s__6221655ks04(line=0.2);
// file: s/6221655ks03.scad
use <../../lib.scad>
function ldraw_lib__s__6221655ks03() = [
// 0 ~Sticker  0.8 x  3.0 with White Logos on Black Background Right - Eighth Face
// 0 Name: s\6221655ks03.dat
// 0 Author: Massimo Maso [Sirio]
// 0 !LDRAW_ORG Subpart UPDATE 2025-03
// 0 !LICENSE Licensed under CC BY 4.0 : see CAreadme.txt
// 
// 0 BFC CERTIFY CCW
  [0,"BFC","CERTIFY"],
  [0,"BFC","CCW"],
// 
// 0 !HISTORY 2025-03-30 [OrionP] Official Update 2025-03
// 
// 0 // Faces
// 0 // Black faces
// 3 0 -8 -.25 .0165 -6.5 -.25 -2.4234 -6.5 -.25 .0165
  [3,0,-8,-.25,.0165,-6.5,-.25,-2.4234,-6.5,-.25,.0165],
// 4 0 -8 -.25 .0165 -8 -.25 -5.2482 -6.5 -.25 -4.4534 -6.5 -.25 -2.4234
  [4,0,-8,-.25,.0165,-8,-.25,-5.2482,-6.5,-.25,-4.4534,-6.5,-.25,-2.4234],
// 3 0 8 -.25 .0165 -.83 -.25 .0165 -.83 -.25 -2.4234
  [3,0,8,-.25,.0165,-.83,-.25,.0165,-.83,-.25,-2.4234],
// 4 0 8 -.25 -5.2482 8 -.25 .0165 -.83 -.25 -2.4234 -.83 -.25 -4.4534
  [4,0,8,-.25,-5.2482,8,-.25,.0165,-.83,-.25,-2.4234,-.83,-.25,-4.4534],
// 4 0 -6.29 -.25 -2.2134 -5.73 -.25 -.6384 -5.7566 -.25 -.4137 -5.8182 -.25 -.196
  [4,0,-6.29,-.25,-2.2134,-5.73,-.25,-.6384,-5.7566,-.25,-.4137,-5.8182,-.25,-.196],
// 4 0 -5.03 -.25 -.6384 -5.73 -.25 -.6384 -6.29 -.25 -2.2134 -1.04 -.25 -2.2134
  [4,0,-5.03,-.25,-.6384,-5.73,-.25,-.6384,-6.29,-.25,-2.2134,-1.04,-.25,-2.2134],
// 3 0 -6.29 -.25 -2.2134 -5.8182 -.25 -.196 -5.9225 -.25 .0049
  [3,0,-6.29,-.25,-2.2134,-5.8182,-.25,-.196,-5.9225,-.25,.0049],
// 4 0 -5.9225 -.25 .0049 -5.9338 -.25 .0165 -6.29 -.25 .0165 -6.29 -.25 -2.2134
  [4,0,-5.9225,-.25,.0049,-5.9338,-.25,.0165,-6.29,-.25,.0165,-6.29,-.25,-2.2134],
// 4 0 -5.03 -.25 .0165 -5.03 -.25 -.6384 -1.04 -.25 -2.2134 -1.04 -.25 .0165
  [4,0,-5.03,-.25,.0165,-5.03,-.25,-.6384,-1.04,-.25,-2.2134,-1.04,-.25,.0165],
// 4 0 -6.5 -.25 -4.4534 -.83 -.25 -4.4534 -.83 -.25 -2.4234 -6.5 -.25 -2.4234
  [4,0,-6.5,-.25,-4.4534,-.83,-.25,-4.4534,-.83,-.25,-2.4234,-6.5,-.25,-2.4234],
// 3 0 -6.5 -.25 -4.4534 -8 -.25 -5.2482 -6.5 -.25 -5.2482
  [3,0,-6.5,-.25,-4.4534,-8,-.25,-5.2482,-6.5,-.25,-5.2482],
// 3 0 -.83 -.25 -4.4534 -.83 -.25 -5.2482 8 -.25 -5.2482
  [3,0,-.83,-.25,-4.4534,-.83,-.25,-5.2482,8,-.25,-5.2482],
// 0 // White frame
// 4 15 -6.5 -.25 -2.4234 -.83 -.25 -2.4234 -1.04 -.25 -2.2134 -6.29 -.25 -2.2134
  [4,15,-6.5,-.25,-2.4234,-.83,-.25,-2.4234,-1.04,-.25,-2.2134,-6.29,-.25,-2.2134],
// 4 15 -.83 -.25 -2.4234 -.83 -.25 .0165 -1.04 -.25 .0165 -1.04 -.25 -2.2134
  [4,15,-.83,-.25,-2.4234,-.83,-.25,.0165,-1.04,-.25,.0165,-1.04,-.25,-2.2134],
// 4 15 -6.29 -.25 -2.2134 -6.29 -.25 .0165 -6.5 -.25 .0165 -6.5 -.25 -2.4234
  [4,15,-6.29,-.25,-2.2134,-6.29,-.25,.0165,-6.5,-.25,.0165,-6.5,-.25,-2.4234],
// 0 // White number
// 4 15 -5.03 -.25 -.6384 -5.03 -.25 .0165 -5.9338 -.25 .0165 -5.9225 -.25 .0049
  [4,15,-5.03,-.25,-.6384,-5.03,-.25,.0165,-5.9338,-.25,.0165,-5.9225,-.25,.0049],
// 3 15 -5.03 -.25 -.6384 -5.9225 -.25 .0049 -5.8182 -.25 -.196
  [3,15,-5.03,-.25,-.6384,-5.9225,-.25,.0049,-5.8182,-.25,-.196],
// 3 15 -5.03 -.25 -.6384 -5.8182 -.25 -.196 -5.7566 -.25 -.4137
  [3,15,-5.03,-.25,-.6384,-5.8182,-.25,-.196,-5.7566,-.25,-.4137],
// 3 15 -5.03 -.25 -.6384 -5.7566 -.25 -.4137 -5.73 -.25 -.6384
  [3,15,-5.03,-.25,-.6384,-5.7566,-.25,-.4137,-5.73,-.25,-.6384],
// 0 // White face
// 4 15 -6.5 -.25 -4.4534 -6.5 -.25 -5.2482 -.83 -.25 -5.2482 -.83 -.25 -4.4534
  [4,15,-6.5,-.25,-4.4534,-6.5,-.25,-5.2482,-.83,-.25,-5.2482,-.83,-.25,-4.4534],
];
module ldraw_lib__s__6221655ks03(step=0, col=false, unit=2/5, alt=false, line=0.2, solid=!$preview)
    makepoly(ldraw_lib__s__6221655ks03(), step=step, col=col, unit=unit, alt=alt, line=line, solid=solid);
ldraw_lib__s__6221655ks03(line=0.2);
// file: s/6221655ks02.scad
use <../../lib.scad>
function ldraw_lib__s__6221655ks02() = [
// 0 ~Sticker  0.8 x  3.0 with White Logos on Black Background Right - Seventh Face
// 0 Name: s\6221655ks02.dat
// 0 Author: Massimo Maso [Sirio]
// 0 !LDRAW_ORG Subpart UPDATE 2025-03
// 0 !LICENSE Licensed under CC BY 4.0 : see CAreadme.txt
// 
// 0 BFC CERTIFY CCW
  [0,"BFC","CERTIFY"],
  [0,"BFC","CCW"],
// 
// 0 !HISTORY 2025-03-30 [OrionP] Official Update 2025-03
// 
// 0 // Faces
// 0 // Black face
// 4 0 -8 -.25 5.2486 -8 -.25 -.0165 -6.5 -.25 -.0165 -6.5 -.25 3.2486
  [4,0,-8,-.25,5.2486,-8,-.25,-.0165,-6.5,-.25,-.0165,-6.5,-.25,3.2486],
// 4 0 -8 -.25 5.2486 -6.5 -.25 3.2486 -.83 -.25 3.2486 8 -.25 5.2486
  [4,0,-8,-.25,5.2486,-6.5,-.25,3.2486,-.83,-.25,3.2486,8,-.25,5.2486],
// 4 0 8 -.25 5.2486 -.83 -.25 3.2486 -.83 -.25 -.0165 8 -.25 -.0165
  [4,0,8,-.25,5.2486,-.83,-.25,3.2486,-.83,-.25,-.0165,8,-.25,-.0165],
// 4 0 -6.29 -.25 3.0386 -6.08 -.25 1.0786 -1.355 -.25 1.0786 -1.04 -.25 3.0386
  [4,0,-6.29,-.25,3.0386,-6.08,-.25,1.0786,-1.355,-.25,1.0786,-1.04,-.25,3.0386],
// 4 0 -6.08 -.25 1.0786 -6.29 -.25 3.0386 -6.29 -.25 -.0165 -6.08 -.25 .1336
  [4,0,-6.08,-.25,1.0786,-6.29,-.25,3.0386,-6.29,-.25,-.0165,-6.08,-.25,.1336],
// 4 0 -1.355 -.25 1.0786 -1.355 -.25 .0286 -1.04 -.25 -.0165 -1.04 -.25 3.0386
  [4,0,-1.355,-.25,1.0786,-1.355,-.25,.0286,-1.04,-.25,-.0165,-1.04,-.25,3.0386],
// 3 0 -6.29 -.25 -.0165 -5.9338 -.25 -.0165 -6.08 -.25 .1336
  [3,0,-6.29,-.25,-.0165,-5.9338,-.25,-.0165,-6.08,-.25,.1336],
// 4 0 -5.03 -.25 .0286 -5.03 -.25 -.0165 -1.04 -.25 -.0165 -1.355 -.25 .0286
  [4,0,-5.03,-.25,.0286,-5.03,-.25,-.0165,-1.04,-.25,-.0165,-1.355,-.25,.0286],
// 0 // White frame
// 4 15 -.83 -.25 3.2486 -6.5 -.25 3.2486 -6.29 -.25 3.0386 -1.04 -.25 3.0386
  [4,15,-.83,-.25,3.2486,-6.5,-.25,3.2486,-6.29,-.25,3.0386,-1.04,-.25,3.0386],
// 4 15 -1.04 -.25 3.0386 -1.04 -.25 -.0165 -.83 -.25 -.0165 -.83 -.25 3.2486
  [4,15,-1.04,-.25,3.0386,-1.04,-.25,-.0165,-.83,-.25,-.0165,-.83,-.25,3.2486],
// 4 15 -6.5 -.25 3.2486 -6.5 -.25 -.0165 -6.29 -.25 -.0165 -6.29 -.25 3.0386
  [4,15,-6.5,-.25,3.2486,-6.5,-.25,-.0165,-6.29,-.25,-.0165,-6.29,-.25,3.0386],
// 0 // White number
// 4 15 -5.03 -.25 .0286 -1.355 -.25 .0286 -1.355 -.25 1.0786 -6.08 -.25 1.0786
  [4,15,-5.03,-.25,.0286,-1.355,-.25,.0286,-1.355,-.25,1.0786,-6.08,-.25,1.0786],
// 3 15 -5.03 -.25 .0286 -6.08 -.25 1.0786 -6.08 -.25 .1336
  [3,15,-5.03,-.25,.0286,-6.08,-.25,1.0786,-6.08,-.25,.1336],
// 4 15 -5.03 -.25 .0286 -6.08 -.25 .1336 -5.9338 -.25 -.0165 -5.03 -.25 -.0165
  [4,15,-5.03,-.25,.0286,-6.08,-.25,.1336,-5.9338,-.25,-.0165,-5.03,-.25,-.0165],
];
module ldraw_lib__s__6221655ks02(step=0, col=false, unit=2/5, alt=false, line=0.2, solid=!$preview)
    makepoly(ldraw_lib__s__6221655ks02(), step=step, col=col, unit=unit, alt=alt, line=line, solid=solid);
ldraw_lib__s__6221655ks02(line=0.2);
// file: s/6221655ks01.scad
use <../../lib.scad>
use <../../p/1-4chrd.scad>
function ldraw_lib__s__6221655ks01() = [
// 0 ~Sticker  0.8 x  3.0 with White Logos on Black Background Right - First Face
// 0 Name: s\6221655ks01.dat
// 0 Author: Massimo Maso [Sirio]
// 0 !LDRAW_ORG Subpart UPDATE 2025-03
// 0 !LICENSE Licensed under CC BY 4.0 : see CAreadme.txt
// 
// 0 BFC CERTIFY CCW
  [0,"BFC","CERTIFY"],
  [0,"BFC","CCW"],
// 
// 0 !HISTORY 2025-03-30 [OrionP] Official Update 2025-03
// 
// 0 // Primitives
// 1 0 -6.5 -.25 1.7313 -1.5 0 0 0 1 0 0 0 1.5 1-4chrd.dat
  [1,0,-6.5,-.25,1.7313,-1.5,0,0,0,1,0,0,0,1.5, ldraw_lib__1_4chrd()],
// 1 0 6.5 -.25 1.7313 1.5 0 0 0 1 0 0 0 1.5 1-4chrd.dat
  [1,0,6.5,-.25,1.7313,1.5,0,0,0,1,0,0,0,1.5, ldraw_lib__1_4chrd()],
// 0 // Black faces
// 4 0 -8 -.25 1.7313 8 -.25 1.7313 6.5 -.25 3.2313 -6.5 -.25 3.2313
  [4,0,-8,-.25,1.7313,8,-.25,1.7313,6.5,-.25,3.2313,-6.5,-.25,3.2313],
// 4 0 -8 -.25 1.7313 -8 -.25 -.0163 8 -.25 -.0163 8 -.25 1.7313
  [4,0,-8,-.25,1.7313,-8,-.25,-.0163,8,-.25,-.0163,8,-.25,1.7313],
];
module ldraw_lib__s__6221655ks01(step=0, col=false, unit=2/5, alt=false, line=0.2, solid=!$preview)
    makepoly(ldraw_lib__s__6221655ks01(), step=step, col=col, unit=unit, alt=alt, line=line, solid=solid);
ldraw_lib__s__6221655ks01(line=0.2);
// main file
use <../lib.scad>
use <s/6221655ks01.scad>
use <s/6221655ks02.scad>
use <s/6221655ks03.scad>
use <s/6221655ks04.scad>
use <s/6221655ks05.scad>
use <s/6221655ks06.scad>
use <s/6221655ks07.scad>
use <s/6221655ks08.scad>
function ldraw_lib__6221655k() = [
// 0 Sticker  0.8 x  3.0 with White Logos on Black Background Right
// 0 Name: 6221655k.dat
// 0 Author: Massimo Maso [Sirio]
// 0 !LDRAW_ORG Part UPDATE 2025-03
// 0 !LICENSE Licensed under CC BY 4.0 : see CAreadme.txt
// 
// 0 BFC CERTIFY CCW
  [0,"BFC","CERTIFY"],
  [0,"BFC","CCW"],
// 
// 0 !KEYWORDS 3.0, 911 RSR, Porsche, Set 75888, Speed Champions, Turbo
// 
// 0 !HISTORY 2025-03-30 [OrionP] Official Update 2025-03
// 
// 1 16 26.3422 0 0 0 0 1 0 1 0 -1 0 0 s\6221655ks01.dat
  [1,16,26.3422,0,0,0,0,1,0,1,0,-1,0,0, ldraw_lib__s__6221655ks01()],
// 1 16 -5.2486 0 0 0 0 1 0 1 0 -1 0 0 s\6221655ks02.dat
  [1,16,-5.2486,0,0,0,0,1,0,1,0,-1,0,0, ldraw_lib__s__6221655ks02()],
// 1 16 -5.2816 0 0 0 0 1 0 1 0 -1 0 0 s\6221655ks03.dat
  [1,16,-5.2816,0,0,0,0,1,0,1,0,-1,0,0, ldraw_lib__s__6221655ks03()],
// 1 16 -15.7785 0 0 0 0 1 0 1 0 -1 0 0 s\6221655ks04.dat
  [1,16,-15.7785,0,0,0,0,1,0,1,0,-1,0,0, ldraw_lib__s__6221655ks04()],
// 1 16 -15.8115 0 0 0 0 1 0 1 0 -1 0 0 s\6221655ks05.dat
  [1,16,-15.8115,0,0,0,0,1,0,1,0,-1,0,0, ldraw_lib__s__6221655ks05()],
// 1 16 -26.3096 0 0 0 0 1 0 1 0 -1 0 0 s\6221655ks06.dat
  [1,16,-26.3096,0,0,0,0,1,0,1,0,-1,0,0, ldraw_lib__s__6221655ks06()],
// 1 16 -26.3422 0 0 0 0 1 0 1 0 -1 0 0 s\6221655ks07.dat
  [1,16,-26.3422,0,0,0,0,1,0,1,0,-1,0,0, ldraw_lib__s__6221655ks07()],
// 1 16 0 0 0 0 0 1 0 1 0 -1 0 0 s\6221655ks08.dat
  [1,16,0,0,0,0,0,1,0,1,0,-1,0,0, ldraw_lib__s__6221655ks08()],
// 0 // Complementary face
// 4 0 0 -.25 8 0 -.25 -8 26.3259 -.25 -8 26.3259 -.25 8
  [4,0,0,-.25,8,0,-.25,-8,26.3259,-.25,-8,26.3259,-.25,8],
];
module ldraw_lib__6221655k(step=0, col=false, unit=2/5, alt=false, line=0.2, solid=!$preview)
    makepoly(ldraw_lib__6221655k(), step=step, col=col, unit=unit, alt=alt, line=line, solid=solid);
ldraw_lib__6221655k(line=0.2);
